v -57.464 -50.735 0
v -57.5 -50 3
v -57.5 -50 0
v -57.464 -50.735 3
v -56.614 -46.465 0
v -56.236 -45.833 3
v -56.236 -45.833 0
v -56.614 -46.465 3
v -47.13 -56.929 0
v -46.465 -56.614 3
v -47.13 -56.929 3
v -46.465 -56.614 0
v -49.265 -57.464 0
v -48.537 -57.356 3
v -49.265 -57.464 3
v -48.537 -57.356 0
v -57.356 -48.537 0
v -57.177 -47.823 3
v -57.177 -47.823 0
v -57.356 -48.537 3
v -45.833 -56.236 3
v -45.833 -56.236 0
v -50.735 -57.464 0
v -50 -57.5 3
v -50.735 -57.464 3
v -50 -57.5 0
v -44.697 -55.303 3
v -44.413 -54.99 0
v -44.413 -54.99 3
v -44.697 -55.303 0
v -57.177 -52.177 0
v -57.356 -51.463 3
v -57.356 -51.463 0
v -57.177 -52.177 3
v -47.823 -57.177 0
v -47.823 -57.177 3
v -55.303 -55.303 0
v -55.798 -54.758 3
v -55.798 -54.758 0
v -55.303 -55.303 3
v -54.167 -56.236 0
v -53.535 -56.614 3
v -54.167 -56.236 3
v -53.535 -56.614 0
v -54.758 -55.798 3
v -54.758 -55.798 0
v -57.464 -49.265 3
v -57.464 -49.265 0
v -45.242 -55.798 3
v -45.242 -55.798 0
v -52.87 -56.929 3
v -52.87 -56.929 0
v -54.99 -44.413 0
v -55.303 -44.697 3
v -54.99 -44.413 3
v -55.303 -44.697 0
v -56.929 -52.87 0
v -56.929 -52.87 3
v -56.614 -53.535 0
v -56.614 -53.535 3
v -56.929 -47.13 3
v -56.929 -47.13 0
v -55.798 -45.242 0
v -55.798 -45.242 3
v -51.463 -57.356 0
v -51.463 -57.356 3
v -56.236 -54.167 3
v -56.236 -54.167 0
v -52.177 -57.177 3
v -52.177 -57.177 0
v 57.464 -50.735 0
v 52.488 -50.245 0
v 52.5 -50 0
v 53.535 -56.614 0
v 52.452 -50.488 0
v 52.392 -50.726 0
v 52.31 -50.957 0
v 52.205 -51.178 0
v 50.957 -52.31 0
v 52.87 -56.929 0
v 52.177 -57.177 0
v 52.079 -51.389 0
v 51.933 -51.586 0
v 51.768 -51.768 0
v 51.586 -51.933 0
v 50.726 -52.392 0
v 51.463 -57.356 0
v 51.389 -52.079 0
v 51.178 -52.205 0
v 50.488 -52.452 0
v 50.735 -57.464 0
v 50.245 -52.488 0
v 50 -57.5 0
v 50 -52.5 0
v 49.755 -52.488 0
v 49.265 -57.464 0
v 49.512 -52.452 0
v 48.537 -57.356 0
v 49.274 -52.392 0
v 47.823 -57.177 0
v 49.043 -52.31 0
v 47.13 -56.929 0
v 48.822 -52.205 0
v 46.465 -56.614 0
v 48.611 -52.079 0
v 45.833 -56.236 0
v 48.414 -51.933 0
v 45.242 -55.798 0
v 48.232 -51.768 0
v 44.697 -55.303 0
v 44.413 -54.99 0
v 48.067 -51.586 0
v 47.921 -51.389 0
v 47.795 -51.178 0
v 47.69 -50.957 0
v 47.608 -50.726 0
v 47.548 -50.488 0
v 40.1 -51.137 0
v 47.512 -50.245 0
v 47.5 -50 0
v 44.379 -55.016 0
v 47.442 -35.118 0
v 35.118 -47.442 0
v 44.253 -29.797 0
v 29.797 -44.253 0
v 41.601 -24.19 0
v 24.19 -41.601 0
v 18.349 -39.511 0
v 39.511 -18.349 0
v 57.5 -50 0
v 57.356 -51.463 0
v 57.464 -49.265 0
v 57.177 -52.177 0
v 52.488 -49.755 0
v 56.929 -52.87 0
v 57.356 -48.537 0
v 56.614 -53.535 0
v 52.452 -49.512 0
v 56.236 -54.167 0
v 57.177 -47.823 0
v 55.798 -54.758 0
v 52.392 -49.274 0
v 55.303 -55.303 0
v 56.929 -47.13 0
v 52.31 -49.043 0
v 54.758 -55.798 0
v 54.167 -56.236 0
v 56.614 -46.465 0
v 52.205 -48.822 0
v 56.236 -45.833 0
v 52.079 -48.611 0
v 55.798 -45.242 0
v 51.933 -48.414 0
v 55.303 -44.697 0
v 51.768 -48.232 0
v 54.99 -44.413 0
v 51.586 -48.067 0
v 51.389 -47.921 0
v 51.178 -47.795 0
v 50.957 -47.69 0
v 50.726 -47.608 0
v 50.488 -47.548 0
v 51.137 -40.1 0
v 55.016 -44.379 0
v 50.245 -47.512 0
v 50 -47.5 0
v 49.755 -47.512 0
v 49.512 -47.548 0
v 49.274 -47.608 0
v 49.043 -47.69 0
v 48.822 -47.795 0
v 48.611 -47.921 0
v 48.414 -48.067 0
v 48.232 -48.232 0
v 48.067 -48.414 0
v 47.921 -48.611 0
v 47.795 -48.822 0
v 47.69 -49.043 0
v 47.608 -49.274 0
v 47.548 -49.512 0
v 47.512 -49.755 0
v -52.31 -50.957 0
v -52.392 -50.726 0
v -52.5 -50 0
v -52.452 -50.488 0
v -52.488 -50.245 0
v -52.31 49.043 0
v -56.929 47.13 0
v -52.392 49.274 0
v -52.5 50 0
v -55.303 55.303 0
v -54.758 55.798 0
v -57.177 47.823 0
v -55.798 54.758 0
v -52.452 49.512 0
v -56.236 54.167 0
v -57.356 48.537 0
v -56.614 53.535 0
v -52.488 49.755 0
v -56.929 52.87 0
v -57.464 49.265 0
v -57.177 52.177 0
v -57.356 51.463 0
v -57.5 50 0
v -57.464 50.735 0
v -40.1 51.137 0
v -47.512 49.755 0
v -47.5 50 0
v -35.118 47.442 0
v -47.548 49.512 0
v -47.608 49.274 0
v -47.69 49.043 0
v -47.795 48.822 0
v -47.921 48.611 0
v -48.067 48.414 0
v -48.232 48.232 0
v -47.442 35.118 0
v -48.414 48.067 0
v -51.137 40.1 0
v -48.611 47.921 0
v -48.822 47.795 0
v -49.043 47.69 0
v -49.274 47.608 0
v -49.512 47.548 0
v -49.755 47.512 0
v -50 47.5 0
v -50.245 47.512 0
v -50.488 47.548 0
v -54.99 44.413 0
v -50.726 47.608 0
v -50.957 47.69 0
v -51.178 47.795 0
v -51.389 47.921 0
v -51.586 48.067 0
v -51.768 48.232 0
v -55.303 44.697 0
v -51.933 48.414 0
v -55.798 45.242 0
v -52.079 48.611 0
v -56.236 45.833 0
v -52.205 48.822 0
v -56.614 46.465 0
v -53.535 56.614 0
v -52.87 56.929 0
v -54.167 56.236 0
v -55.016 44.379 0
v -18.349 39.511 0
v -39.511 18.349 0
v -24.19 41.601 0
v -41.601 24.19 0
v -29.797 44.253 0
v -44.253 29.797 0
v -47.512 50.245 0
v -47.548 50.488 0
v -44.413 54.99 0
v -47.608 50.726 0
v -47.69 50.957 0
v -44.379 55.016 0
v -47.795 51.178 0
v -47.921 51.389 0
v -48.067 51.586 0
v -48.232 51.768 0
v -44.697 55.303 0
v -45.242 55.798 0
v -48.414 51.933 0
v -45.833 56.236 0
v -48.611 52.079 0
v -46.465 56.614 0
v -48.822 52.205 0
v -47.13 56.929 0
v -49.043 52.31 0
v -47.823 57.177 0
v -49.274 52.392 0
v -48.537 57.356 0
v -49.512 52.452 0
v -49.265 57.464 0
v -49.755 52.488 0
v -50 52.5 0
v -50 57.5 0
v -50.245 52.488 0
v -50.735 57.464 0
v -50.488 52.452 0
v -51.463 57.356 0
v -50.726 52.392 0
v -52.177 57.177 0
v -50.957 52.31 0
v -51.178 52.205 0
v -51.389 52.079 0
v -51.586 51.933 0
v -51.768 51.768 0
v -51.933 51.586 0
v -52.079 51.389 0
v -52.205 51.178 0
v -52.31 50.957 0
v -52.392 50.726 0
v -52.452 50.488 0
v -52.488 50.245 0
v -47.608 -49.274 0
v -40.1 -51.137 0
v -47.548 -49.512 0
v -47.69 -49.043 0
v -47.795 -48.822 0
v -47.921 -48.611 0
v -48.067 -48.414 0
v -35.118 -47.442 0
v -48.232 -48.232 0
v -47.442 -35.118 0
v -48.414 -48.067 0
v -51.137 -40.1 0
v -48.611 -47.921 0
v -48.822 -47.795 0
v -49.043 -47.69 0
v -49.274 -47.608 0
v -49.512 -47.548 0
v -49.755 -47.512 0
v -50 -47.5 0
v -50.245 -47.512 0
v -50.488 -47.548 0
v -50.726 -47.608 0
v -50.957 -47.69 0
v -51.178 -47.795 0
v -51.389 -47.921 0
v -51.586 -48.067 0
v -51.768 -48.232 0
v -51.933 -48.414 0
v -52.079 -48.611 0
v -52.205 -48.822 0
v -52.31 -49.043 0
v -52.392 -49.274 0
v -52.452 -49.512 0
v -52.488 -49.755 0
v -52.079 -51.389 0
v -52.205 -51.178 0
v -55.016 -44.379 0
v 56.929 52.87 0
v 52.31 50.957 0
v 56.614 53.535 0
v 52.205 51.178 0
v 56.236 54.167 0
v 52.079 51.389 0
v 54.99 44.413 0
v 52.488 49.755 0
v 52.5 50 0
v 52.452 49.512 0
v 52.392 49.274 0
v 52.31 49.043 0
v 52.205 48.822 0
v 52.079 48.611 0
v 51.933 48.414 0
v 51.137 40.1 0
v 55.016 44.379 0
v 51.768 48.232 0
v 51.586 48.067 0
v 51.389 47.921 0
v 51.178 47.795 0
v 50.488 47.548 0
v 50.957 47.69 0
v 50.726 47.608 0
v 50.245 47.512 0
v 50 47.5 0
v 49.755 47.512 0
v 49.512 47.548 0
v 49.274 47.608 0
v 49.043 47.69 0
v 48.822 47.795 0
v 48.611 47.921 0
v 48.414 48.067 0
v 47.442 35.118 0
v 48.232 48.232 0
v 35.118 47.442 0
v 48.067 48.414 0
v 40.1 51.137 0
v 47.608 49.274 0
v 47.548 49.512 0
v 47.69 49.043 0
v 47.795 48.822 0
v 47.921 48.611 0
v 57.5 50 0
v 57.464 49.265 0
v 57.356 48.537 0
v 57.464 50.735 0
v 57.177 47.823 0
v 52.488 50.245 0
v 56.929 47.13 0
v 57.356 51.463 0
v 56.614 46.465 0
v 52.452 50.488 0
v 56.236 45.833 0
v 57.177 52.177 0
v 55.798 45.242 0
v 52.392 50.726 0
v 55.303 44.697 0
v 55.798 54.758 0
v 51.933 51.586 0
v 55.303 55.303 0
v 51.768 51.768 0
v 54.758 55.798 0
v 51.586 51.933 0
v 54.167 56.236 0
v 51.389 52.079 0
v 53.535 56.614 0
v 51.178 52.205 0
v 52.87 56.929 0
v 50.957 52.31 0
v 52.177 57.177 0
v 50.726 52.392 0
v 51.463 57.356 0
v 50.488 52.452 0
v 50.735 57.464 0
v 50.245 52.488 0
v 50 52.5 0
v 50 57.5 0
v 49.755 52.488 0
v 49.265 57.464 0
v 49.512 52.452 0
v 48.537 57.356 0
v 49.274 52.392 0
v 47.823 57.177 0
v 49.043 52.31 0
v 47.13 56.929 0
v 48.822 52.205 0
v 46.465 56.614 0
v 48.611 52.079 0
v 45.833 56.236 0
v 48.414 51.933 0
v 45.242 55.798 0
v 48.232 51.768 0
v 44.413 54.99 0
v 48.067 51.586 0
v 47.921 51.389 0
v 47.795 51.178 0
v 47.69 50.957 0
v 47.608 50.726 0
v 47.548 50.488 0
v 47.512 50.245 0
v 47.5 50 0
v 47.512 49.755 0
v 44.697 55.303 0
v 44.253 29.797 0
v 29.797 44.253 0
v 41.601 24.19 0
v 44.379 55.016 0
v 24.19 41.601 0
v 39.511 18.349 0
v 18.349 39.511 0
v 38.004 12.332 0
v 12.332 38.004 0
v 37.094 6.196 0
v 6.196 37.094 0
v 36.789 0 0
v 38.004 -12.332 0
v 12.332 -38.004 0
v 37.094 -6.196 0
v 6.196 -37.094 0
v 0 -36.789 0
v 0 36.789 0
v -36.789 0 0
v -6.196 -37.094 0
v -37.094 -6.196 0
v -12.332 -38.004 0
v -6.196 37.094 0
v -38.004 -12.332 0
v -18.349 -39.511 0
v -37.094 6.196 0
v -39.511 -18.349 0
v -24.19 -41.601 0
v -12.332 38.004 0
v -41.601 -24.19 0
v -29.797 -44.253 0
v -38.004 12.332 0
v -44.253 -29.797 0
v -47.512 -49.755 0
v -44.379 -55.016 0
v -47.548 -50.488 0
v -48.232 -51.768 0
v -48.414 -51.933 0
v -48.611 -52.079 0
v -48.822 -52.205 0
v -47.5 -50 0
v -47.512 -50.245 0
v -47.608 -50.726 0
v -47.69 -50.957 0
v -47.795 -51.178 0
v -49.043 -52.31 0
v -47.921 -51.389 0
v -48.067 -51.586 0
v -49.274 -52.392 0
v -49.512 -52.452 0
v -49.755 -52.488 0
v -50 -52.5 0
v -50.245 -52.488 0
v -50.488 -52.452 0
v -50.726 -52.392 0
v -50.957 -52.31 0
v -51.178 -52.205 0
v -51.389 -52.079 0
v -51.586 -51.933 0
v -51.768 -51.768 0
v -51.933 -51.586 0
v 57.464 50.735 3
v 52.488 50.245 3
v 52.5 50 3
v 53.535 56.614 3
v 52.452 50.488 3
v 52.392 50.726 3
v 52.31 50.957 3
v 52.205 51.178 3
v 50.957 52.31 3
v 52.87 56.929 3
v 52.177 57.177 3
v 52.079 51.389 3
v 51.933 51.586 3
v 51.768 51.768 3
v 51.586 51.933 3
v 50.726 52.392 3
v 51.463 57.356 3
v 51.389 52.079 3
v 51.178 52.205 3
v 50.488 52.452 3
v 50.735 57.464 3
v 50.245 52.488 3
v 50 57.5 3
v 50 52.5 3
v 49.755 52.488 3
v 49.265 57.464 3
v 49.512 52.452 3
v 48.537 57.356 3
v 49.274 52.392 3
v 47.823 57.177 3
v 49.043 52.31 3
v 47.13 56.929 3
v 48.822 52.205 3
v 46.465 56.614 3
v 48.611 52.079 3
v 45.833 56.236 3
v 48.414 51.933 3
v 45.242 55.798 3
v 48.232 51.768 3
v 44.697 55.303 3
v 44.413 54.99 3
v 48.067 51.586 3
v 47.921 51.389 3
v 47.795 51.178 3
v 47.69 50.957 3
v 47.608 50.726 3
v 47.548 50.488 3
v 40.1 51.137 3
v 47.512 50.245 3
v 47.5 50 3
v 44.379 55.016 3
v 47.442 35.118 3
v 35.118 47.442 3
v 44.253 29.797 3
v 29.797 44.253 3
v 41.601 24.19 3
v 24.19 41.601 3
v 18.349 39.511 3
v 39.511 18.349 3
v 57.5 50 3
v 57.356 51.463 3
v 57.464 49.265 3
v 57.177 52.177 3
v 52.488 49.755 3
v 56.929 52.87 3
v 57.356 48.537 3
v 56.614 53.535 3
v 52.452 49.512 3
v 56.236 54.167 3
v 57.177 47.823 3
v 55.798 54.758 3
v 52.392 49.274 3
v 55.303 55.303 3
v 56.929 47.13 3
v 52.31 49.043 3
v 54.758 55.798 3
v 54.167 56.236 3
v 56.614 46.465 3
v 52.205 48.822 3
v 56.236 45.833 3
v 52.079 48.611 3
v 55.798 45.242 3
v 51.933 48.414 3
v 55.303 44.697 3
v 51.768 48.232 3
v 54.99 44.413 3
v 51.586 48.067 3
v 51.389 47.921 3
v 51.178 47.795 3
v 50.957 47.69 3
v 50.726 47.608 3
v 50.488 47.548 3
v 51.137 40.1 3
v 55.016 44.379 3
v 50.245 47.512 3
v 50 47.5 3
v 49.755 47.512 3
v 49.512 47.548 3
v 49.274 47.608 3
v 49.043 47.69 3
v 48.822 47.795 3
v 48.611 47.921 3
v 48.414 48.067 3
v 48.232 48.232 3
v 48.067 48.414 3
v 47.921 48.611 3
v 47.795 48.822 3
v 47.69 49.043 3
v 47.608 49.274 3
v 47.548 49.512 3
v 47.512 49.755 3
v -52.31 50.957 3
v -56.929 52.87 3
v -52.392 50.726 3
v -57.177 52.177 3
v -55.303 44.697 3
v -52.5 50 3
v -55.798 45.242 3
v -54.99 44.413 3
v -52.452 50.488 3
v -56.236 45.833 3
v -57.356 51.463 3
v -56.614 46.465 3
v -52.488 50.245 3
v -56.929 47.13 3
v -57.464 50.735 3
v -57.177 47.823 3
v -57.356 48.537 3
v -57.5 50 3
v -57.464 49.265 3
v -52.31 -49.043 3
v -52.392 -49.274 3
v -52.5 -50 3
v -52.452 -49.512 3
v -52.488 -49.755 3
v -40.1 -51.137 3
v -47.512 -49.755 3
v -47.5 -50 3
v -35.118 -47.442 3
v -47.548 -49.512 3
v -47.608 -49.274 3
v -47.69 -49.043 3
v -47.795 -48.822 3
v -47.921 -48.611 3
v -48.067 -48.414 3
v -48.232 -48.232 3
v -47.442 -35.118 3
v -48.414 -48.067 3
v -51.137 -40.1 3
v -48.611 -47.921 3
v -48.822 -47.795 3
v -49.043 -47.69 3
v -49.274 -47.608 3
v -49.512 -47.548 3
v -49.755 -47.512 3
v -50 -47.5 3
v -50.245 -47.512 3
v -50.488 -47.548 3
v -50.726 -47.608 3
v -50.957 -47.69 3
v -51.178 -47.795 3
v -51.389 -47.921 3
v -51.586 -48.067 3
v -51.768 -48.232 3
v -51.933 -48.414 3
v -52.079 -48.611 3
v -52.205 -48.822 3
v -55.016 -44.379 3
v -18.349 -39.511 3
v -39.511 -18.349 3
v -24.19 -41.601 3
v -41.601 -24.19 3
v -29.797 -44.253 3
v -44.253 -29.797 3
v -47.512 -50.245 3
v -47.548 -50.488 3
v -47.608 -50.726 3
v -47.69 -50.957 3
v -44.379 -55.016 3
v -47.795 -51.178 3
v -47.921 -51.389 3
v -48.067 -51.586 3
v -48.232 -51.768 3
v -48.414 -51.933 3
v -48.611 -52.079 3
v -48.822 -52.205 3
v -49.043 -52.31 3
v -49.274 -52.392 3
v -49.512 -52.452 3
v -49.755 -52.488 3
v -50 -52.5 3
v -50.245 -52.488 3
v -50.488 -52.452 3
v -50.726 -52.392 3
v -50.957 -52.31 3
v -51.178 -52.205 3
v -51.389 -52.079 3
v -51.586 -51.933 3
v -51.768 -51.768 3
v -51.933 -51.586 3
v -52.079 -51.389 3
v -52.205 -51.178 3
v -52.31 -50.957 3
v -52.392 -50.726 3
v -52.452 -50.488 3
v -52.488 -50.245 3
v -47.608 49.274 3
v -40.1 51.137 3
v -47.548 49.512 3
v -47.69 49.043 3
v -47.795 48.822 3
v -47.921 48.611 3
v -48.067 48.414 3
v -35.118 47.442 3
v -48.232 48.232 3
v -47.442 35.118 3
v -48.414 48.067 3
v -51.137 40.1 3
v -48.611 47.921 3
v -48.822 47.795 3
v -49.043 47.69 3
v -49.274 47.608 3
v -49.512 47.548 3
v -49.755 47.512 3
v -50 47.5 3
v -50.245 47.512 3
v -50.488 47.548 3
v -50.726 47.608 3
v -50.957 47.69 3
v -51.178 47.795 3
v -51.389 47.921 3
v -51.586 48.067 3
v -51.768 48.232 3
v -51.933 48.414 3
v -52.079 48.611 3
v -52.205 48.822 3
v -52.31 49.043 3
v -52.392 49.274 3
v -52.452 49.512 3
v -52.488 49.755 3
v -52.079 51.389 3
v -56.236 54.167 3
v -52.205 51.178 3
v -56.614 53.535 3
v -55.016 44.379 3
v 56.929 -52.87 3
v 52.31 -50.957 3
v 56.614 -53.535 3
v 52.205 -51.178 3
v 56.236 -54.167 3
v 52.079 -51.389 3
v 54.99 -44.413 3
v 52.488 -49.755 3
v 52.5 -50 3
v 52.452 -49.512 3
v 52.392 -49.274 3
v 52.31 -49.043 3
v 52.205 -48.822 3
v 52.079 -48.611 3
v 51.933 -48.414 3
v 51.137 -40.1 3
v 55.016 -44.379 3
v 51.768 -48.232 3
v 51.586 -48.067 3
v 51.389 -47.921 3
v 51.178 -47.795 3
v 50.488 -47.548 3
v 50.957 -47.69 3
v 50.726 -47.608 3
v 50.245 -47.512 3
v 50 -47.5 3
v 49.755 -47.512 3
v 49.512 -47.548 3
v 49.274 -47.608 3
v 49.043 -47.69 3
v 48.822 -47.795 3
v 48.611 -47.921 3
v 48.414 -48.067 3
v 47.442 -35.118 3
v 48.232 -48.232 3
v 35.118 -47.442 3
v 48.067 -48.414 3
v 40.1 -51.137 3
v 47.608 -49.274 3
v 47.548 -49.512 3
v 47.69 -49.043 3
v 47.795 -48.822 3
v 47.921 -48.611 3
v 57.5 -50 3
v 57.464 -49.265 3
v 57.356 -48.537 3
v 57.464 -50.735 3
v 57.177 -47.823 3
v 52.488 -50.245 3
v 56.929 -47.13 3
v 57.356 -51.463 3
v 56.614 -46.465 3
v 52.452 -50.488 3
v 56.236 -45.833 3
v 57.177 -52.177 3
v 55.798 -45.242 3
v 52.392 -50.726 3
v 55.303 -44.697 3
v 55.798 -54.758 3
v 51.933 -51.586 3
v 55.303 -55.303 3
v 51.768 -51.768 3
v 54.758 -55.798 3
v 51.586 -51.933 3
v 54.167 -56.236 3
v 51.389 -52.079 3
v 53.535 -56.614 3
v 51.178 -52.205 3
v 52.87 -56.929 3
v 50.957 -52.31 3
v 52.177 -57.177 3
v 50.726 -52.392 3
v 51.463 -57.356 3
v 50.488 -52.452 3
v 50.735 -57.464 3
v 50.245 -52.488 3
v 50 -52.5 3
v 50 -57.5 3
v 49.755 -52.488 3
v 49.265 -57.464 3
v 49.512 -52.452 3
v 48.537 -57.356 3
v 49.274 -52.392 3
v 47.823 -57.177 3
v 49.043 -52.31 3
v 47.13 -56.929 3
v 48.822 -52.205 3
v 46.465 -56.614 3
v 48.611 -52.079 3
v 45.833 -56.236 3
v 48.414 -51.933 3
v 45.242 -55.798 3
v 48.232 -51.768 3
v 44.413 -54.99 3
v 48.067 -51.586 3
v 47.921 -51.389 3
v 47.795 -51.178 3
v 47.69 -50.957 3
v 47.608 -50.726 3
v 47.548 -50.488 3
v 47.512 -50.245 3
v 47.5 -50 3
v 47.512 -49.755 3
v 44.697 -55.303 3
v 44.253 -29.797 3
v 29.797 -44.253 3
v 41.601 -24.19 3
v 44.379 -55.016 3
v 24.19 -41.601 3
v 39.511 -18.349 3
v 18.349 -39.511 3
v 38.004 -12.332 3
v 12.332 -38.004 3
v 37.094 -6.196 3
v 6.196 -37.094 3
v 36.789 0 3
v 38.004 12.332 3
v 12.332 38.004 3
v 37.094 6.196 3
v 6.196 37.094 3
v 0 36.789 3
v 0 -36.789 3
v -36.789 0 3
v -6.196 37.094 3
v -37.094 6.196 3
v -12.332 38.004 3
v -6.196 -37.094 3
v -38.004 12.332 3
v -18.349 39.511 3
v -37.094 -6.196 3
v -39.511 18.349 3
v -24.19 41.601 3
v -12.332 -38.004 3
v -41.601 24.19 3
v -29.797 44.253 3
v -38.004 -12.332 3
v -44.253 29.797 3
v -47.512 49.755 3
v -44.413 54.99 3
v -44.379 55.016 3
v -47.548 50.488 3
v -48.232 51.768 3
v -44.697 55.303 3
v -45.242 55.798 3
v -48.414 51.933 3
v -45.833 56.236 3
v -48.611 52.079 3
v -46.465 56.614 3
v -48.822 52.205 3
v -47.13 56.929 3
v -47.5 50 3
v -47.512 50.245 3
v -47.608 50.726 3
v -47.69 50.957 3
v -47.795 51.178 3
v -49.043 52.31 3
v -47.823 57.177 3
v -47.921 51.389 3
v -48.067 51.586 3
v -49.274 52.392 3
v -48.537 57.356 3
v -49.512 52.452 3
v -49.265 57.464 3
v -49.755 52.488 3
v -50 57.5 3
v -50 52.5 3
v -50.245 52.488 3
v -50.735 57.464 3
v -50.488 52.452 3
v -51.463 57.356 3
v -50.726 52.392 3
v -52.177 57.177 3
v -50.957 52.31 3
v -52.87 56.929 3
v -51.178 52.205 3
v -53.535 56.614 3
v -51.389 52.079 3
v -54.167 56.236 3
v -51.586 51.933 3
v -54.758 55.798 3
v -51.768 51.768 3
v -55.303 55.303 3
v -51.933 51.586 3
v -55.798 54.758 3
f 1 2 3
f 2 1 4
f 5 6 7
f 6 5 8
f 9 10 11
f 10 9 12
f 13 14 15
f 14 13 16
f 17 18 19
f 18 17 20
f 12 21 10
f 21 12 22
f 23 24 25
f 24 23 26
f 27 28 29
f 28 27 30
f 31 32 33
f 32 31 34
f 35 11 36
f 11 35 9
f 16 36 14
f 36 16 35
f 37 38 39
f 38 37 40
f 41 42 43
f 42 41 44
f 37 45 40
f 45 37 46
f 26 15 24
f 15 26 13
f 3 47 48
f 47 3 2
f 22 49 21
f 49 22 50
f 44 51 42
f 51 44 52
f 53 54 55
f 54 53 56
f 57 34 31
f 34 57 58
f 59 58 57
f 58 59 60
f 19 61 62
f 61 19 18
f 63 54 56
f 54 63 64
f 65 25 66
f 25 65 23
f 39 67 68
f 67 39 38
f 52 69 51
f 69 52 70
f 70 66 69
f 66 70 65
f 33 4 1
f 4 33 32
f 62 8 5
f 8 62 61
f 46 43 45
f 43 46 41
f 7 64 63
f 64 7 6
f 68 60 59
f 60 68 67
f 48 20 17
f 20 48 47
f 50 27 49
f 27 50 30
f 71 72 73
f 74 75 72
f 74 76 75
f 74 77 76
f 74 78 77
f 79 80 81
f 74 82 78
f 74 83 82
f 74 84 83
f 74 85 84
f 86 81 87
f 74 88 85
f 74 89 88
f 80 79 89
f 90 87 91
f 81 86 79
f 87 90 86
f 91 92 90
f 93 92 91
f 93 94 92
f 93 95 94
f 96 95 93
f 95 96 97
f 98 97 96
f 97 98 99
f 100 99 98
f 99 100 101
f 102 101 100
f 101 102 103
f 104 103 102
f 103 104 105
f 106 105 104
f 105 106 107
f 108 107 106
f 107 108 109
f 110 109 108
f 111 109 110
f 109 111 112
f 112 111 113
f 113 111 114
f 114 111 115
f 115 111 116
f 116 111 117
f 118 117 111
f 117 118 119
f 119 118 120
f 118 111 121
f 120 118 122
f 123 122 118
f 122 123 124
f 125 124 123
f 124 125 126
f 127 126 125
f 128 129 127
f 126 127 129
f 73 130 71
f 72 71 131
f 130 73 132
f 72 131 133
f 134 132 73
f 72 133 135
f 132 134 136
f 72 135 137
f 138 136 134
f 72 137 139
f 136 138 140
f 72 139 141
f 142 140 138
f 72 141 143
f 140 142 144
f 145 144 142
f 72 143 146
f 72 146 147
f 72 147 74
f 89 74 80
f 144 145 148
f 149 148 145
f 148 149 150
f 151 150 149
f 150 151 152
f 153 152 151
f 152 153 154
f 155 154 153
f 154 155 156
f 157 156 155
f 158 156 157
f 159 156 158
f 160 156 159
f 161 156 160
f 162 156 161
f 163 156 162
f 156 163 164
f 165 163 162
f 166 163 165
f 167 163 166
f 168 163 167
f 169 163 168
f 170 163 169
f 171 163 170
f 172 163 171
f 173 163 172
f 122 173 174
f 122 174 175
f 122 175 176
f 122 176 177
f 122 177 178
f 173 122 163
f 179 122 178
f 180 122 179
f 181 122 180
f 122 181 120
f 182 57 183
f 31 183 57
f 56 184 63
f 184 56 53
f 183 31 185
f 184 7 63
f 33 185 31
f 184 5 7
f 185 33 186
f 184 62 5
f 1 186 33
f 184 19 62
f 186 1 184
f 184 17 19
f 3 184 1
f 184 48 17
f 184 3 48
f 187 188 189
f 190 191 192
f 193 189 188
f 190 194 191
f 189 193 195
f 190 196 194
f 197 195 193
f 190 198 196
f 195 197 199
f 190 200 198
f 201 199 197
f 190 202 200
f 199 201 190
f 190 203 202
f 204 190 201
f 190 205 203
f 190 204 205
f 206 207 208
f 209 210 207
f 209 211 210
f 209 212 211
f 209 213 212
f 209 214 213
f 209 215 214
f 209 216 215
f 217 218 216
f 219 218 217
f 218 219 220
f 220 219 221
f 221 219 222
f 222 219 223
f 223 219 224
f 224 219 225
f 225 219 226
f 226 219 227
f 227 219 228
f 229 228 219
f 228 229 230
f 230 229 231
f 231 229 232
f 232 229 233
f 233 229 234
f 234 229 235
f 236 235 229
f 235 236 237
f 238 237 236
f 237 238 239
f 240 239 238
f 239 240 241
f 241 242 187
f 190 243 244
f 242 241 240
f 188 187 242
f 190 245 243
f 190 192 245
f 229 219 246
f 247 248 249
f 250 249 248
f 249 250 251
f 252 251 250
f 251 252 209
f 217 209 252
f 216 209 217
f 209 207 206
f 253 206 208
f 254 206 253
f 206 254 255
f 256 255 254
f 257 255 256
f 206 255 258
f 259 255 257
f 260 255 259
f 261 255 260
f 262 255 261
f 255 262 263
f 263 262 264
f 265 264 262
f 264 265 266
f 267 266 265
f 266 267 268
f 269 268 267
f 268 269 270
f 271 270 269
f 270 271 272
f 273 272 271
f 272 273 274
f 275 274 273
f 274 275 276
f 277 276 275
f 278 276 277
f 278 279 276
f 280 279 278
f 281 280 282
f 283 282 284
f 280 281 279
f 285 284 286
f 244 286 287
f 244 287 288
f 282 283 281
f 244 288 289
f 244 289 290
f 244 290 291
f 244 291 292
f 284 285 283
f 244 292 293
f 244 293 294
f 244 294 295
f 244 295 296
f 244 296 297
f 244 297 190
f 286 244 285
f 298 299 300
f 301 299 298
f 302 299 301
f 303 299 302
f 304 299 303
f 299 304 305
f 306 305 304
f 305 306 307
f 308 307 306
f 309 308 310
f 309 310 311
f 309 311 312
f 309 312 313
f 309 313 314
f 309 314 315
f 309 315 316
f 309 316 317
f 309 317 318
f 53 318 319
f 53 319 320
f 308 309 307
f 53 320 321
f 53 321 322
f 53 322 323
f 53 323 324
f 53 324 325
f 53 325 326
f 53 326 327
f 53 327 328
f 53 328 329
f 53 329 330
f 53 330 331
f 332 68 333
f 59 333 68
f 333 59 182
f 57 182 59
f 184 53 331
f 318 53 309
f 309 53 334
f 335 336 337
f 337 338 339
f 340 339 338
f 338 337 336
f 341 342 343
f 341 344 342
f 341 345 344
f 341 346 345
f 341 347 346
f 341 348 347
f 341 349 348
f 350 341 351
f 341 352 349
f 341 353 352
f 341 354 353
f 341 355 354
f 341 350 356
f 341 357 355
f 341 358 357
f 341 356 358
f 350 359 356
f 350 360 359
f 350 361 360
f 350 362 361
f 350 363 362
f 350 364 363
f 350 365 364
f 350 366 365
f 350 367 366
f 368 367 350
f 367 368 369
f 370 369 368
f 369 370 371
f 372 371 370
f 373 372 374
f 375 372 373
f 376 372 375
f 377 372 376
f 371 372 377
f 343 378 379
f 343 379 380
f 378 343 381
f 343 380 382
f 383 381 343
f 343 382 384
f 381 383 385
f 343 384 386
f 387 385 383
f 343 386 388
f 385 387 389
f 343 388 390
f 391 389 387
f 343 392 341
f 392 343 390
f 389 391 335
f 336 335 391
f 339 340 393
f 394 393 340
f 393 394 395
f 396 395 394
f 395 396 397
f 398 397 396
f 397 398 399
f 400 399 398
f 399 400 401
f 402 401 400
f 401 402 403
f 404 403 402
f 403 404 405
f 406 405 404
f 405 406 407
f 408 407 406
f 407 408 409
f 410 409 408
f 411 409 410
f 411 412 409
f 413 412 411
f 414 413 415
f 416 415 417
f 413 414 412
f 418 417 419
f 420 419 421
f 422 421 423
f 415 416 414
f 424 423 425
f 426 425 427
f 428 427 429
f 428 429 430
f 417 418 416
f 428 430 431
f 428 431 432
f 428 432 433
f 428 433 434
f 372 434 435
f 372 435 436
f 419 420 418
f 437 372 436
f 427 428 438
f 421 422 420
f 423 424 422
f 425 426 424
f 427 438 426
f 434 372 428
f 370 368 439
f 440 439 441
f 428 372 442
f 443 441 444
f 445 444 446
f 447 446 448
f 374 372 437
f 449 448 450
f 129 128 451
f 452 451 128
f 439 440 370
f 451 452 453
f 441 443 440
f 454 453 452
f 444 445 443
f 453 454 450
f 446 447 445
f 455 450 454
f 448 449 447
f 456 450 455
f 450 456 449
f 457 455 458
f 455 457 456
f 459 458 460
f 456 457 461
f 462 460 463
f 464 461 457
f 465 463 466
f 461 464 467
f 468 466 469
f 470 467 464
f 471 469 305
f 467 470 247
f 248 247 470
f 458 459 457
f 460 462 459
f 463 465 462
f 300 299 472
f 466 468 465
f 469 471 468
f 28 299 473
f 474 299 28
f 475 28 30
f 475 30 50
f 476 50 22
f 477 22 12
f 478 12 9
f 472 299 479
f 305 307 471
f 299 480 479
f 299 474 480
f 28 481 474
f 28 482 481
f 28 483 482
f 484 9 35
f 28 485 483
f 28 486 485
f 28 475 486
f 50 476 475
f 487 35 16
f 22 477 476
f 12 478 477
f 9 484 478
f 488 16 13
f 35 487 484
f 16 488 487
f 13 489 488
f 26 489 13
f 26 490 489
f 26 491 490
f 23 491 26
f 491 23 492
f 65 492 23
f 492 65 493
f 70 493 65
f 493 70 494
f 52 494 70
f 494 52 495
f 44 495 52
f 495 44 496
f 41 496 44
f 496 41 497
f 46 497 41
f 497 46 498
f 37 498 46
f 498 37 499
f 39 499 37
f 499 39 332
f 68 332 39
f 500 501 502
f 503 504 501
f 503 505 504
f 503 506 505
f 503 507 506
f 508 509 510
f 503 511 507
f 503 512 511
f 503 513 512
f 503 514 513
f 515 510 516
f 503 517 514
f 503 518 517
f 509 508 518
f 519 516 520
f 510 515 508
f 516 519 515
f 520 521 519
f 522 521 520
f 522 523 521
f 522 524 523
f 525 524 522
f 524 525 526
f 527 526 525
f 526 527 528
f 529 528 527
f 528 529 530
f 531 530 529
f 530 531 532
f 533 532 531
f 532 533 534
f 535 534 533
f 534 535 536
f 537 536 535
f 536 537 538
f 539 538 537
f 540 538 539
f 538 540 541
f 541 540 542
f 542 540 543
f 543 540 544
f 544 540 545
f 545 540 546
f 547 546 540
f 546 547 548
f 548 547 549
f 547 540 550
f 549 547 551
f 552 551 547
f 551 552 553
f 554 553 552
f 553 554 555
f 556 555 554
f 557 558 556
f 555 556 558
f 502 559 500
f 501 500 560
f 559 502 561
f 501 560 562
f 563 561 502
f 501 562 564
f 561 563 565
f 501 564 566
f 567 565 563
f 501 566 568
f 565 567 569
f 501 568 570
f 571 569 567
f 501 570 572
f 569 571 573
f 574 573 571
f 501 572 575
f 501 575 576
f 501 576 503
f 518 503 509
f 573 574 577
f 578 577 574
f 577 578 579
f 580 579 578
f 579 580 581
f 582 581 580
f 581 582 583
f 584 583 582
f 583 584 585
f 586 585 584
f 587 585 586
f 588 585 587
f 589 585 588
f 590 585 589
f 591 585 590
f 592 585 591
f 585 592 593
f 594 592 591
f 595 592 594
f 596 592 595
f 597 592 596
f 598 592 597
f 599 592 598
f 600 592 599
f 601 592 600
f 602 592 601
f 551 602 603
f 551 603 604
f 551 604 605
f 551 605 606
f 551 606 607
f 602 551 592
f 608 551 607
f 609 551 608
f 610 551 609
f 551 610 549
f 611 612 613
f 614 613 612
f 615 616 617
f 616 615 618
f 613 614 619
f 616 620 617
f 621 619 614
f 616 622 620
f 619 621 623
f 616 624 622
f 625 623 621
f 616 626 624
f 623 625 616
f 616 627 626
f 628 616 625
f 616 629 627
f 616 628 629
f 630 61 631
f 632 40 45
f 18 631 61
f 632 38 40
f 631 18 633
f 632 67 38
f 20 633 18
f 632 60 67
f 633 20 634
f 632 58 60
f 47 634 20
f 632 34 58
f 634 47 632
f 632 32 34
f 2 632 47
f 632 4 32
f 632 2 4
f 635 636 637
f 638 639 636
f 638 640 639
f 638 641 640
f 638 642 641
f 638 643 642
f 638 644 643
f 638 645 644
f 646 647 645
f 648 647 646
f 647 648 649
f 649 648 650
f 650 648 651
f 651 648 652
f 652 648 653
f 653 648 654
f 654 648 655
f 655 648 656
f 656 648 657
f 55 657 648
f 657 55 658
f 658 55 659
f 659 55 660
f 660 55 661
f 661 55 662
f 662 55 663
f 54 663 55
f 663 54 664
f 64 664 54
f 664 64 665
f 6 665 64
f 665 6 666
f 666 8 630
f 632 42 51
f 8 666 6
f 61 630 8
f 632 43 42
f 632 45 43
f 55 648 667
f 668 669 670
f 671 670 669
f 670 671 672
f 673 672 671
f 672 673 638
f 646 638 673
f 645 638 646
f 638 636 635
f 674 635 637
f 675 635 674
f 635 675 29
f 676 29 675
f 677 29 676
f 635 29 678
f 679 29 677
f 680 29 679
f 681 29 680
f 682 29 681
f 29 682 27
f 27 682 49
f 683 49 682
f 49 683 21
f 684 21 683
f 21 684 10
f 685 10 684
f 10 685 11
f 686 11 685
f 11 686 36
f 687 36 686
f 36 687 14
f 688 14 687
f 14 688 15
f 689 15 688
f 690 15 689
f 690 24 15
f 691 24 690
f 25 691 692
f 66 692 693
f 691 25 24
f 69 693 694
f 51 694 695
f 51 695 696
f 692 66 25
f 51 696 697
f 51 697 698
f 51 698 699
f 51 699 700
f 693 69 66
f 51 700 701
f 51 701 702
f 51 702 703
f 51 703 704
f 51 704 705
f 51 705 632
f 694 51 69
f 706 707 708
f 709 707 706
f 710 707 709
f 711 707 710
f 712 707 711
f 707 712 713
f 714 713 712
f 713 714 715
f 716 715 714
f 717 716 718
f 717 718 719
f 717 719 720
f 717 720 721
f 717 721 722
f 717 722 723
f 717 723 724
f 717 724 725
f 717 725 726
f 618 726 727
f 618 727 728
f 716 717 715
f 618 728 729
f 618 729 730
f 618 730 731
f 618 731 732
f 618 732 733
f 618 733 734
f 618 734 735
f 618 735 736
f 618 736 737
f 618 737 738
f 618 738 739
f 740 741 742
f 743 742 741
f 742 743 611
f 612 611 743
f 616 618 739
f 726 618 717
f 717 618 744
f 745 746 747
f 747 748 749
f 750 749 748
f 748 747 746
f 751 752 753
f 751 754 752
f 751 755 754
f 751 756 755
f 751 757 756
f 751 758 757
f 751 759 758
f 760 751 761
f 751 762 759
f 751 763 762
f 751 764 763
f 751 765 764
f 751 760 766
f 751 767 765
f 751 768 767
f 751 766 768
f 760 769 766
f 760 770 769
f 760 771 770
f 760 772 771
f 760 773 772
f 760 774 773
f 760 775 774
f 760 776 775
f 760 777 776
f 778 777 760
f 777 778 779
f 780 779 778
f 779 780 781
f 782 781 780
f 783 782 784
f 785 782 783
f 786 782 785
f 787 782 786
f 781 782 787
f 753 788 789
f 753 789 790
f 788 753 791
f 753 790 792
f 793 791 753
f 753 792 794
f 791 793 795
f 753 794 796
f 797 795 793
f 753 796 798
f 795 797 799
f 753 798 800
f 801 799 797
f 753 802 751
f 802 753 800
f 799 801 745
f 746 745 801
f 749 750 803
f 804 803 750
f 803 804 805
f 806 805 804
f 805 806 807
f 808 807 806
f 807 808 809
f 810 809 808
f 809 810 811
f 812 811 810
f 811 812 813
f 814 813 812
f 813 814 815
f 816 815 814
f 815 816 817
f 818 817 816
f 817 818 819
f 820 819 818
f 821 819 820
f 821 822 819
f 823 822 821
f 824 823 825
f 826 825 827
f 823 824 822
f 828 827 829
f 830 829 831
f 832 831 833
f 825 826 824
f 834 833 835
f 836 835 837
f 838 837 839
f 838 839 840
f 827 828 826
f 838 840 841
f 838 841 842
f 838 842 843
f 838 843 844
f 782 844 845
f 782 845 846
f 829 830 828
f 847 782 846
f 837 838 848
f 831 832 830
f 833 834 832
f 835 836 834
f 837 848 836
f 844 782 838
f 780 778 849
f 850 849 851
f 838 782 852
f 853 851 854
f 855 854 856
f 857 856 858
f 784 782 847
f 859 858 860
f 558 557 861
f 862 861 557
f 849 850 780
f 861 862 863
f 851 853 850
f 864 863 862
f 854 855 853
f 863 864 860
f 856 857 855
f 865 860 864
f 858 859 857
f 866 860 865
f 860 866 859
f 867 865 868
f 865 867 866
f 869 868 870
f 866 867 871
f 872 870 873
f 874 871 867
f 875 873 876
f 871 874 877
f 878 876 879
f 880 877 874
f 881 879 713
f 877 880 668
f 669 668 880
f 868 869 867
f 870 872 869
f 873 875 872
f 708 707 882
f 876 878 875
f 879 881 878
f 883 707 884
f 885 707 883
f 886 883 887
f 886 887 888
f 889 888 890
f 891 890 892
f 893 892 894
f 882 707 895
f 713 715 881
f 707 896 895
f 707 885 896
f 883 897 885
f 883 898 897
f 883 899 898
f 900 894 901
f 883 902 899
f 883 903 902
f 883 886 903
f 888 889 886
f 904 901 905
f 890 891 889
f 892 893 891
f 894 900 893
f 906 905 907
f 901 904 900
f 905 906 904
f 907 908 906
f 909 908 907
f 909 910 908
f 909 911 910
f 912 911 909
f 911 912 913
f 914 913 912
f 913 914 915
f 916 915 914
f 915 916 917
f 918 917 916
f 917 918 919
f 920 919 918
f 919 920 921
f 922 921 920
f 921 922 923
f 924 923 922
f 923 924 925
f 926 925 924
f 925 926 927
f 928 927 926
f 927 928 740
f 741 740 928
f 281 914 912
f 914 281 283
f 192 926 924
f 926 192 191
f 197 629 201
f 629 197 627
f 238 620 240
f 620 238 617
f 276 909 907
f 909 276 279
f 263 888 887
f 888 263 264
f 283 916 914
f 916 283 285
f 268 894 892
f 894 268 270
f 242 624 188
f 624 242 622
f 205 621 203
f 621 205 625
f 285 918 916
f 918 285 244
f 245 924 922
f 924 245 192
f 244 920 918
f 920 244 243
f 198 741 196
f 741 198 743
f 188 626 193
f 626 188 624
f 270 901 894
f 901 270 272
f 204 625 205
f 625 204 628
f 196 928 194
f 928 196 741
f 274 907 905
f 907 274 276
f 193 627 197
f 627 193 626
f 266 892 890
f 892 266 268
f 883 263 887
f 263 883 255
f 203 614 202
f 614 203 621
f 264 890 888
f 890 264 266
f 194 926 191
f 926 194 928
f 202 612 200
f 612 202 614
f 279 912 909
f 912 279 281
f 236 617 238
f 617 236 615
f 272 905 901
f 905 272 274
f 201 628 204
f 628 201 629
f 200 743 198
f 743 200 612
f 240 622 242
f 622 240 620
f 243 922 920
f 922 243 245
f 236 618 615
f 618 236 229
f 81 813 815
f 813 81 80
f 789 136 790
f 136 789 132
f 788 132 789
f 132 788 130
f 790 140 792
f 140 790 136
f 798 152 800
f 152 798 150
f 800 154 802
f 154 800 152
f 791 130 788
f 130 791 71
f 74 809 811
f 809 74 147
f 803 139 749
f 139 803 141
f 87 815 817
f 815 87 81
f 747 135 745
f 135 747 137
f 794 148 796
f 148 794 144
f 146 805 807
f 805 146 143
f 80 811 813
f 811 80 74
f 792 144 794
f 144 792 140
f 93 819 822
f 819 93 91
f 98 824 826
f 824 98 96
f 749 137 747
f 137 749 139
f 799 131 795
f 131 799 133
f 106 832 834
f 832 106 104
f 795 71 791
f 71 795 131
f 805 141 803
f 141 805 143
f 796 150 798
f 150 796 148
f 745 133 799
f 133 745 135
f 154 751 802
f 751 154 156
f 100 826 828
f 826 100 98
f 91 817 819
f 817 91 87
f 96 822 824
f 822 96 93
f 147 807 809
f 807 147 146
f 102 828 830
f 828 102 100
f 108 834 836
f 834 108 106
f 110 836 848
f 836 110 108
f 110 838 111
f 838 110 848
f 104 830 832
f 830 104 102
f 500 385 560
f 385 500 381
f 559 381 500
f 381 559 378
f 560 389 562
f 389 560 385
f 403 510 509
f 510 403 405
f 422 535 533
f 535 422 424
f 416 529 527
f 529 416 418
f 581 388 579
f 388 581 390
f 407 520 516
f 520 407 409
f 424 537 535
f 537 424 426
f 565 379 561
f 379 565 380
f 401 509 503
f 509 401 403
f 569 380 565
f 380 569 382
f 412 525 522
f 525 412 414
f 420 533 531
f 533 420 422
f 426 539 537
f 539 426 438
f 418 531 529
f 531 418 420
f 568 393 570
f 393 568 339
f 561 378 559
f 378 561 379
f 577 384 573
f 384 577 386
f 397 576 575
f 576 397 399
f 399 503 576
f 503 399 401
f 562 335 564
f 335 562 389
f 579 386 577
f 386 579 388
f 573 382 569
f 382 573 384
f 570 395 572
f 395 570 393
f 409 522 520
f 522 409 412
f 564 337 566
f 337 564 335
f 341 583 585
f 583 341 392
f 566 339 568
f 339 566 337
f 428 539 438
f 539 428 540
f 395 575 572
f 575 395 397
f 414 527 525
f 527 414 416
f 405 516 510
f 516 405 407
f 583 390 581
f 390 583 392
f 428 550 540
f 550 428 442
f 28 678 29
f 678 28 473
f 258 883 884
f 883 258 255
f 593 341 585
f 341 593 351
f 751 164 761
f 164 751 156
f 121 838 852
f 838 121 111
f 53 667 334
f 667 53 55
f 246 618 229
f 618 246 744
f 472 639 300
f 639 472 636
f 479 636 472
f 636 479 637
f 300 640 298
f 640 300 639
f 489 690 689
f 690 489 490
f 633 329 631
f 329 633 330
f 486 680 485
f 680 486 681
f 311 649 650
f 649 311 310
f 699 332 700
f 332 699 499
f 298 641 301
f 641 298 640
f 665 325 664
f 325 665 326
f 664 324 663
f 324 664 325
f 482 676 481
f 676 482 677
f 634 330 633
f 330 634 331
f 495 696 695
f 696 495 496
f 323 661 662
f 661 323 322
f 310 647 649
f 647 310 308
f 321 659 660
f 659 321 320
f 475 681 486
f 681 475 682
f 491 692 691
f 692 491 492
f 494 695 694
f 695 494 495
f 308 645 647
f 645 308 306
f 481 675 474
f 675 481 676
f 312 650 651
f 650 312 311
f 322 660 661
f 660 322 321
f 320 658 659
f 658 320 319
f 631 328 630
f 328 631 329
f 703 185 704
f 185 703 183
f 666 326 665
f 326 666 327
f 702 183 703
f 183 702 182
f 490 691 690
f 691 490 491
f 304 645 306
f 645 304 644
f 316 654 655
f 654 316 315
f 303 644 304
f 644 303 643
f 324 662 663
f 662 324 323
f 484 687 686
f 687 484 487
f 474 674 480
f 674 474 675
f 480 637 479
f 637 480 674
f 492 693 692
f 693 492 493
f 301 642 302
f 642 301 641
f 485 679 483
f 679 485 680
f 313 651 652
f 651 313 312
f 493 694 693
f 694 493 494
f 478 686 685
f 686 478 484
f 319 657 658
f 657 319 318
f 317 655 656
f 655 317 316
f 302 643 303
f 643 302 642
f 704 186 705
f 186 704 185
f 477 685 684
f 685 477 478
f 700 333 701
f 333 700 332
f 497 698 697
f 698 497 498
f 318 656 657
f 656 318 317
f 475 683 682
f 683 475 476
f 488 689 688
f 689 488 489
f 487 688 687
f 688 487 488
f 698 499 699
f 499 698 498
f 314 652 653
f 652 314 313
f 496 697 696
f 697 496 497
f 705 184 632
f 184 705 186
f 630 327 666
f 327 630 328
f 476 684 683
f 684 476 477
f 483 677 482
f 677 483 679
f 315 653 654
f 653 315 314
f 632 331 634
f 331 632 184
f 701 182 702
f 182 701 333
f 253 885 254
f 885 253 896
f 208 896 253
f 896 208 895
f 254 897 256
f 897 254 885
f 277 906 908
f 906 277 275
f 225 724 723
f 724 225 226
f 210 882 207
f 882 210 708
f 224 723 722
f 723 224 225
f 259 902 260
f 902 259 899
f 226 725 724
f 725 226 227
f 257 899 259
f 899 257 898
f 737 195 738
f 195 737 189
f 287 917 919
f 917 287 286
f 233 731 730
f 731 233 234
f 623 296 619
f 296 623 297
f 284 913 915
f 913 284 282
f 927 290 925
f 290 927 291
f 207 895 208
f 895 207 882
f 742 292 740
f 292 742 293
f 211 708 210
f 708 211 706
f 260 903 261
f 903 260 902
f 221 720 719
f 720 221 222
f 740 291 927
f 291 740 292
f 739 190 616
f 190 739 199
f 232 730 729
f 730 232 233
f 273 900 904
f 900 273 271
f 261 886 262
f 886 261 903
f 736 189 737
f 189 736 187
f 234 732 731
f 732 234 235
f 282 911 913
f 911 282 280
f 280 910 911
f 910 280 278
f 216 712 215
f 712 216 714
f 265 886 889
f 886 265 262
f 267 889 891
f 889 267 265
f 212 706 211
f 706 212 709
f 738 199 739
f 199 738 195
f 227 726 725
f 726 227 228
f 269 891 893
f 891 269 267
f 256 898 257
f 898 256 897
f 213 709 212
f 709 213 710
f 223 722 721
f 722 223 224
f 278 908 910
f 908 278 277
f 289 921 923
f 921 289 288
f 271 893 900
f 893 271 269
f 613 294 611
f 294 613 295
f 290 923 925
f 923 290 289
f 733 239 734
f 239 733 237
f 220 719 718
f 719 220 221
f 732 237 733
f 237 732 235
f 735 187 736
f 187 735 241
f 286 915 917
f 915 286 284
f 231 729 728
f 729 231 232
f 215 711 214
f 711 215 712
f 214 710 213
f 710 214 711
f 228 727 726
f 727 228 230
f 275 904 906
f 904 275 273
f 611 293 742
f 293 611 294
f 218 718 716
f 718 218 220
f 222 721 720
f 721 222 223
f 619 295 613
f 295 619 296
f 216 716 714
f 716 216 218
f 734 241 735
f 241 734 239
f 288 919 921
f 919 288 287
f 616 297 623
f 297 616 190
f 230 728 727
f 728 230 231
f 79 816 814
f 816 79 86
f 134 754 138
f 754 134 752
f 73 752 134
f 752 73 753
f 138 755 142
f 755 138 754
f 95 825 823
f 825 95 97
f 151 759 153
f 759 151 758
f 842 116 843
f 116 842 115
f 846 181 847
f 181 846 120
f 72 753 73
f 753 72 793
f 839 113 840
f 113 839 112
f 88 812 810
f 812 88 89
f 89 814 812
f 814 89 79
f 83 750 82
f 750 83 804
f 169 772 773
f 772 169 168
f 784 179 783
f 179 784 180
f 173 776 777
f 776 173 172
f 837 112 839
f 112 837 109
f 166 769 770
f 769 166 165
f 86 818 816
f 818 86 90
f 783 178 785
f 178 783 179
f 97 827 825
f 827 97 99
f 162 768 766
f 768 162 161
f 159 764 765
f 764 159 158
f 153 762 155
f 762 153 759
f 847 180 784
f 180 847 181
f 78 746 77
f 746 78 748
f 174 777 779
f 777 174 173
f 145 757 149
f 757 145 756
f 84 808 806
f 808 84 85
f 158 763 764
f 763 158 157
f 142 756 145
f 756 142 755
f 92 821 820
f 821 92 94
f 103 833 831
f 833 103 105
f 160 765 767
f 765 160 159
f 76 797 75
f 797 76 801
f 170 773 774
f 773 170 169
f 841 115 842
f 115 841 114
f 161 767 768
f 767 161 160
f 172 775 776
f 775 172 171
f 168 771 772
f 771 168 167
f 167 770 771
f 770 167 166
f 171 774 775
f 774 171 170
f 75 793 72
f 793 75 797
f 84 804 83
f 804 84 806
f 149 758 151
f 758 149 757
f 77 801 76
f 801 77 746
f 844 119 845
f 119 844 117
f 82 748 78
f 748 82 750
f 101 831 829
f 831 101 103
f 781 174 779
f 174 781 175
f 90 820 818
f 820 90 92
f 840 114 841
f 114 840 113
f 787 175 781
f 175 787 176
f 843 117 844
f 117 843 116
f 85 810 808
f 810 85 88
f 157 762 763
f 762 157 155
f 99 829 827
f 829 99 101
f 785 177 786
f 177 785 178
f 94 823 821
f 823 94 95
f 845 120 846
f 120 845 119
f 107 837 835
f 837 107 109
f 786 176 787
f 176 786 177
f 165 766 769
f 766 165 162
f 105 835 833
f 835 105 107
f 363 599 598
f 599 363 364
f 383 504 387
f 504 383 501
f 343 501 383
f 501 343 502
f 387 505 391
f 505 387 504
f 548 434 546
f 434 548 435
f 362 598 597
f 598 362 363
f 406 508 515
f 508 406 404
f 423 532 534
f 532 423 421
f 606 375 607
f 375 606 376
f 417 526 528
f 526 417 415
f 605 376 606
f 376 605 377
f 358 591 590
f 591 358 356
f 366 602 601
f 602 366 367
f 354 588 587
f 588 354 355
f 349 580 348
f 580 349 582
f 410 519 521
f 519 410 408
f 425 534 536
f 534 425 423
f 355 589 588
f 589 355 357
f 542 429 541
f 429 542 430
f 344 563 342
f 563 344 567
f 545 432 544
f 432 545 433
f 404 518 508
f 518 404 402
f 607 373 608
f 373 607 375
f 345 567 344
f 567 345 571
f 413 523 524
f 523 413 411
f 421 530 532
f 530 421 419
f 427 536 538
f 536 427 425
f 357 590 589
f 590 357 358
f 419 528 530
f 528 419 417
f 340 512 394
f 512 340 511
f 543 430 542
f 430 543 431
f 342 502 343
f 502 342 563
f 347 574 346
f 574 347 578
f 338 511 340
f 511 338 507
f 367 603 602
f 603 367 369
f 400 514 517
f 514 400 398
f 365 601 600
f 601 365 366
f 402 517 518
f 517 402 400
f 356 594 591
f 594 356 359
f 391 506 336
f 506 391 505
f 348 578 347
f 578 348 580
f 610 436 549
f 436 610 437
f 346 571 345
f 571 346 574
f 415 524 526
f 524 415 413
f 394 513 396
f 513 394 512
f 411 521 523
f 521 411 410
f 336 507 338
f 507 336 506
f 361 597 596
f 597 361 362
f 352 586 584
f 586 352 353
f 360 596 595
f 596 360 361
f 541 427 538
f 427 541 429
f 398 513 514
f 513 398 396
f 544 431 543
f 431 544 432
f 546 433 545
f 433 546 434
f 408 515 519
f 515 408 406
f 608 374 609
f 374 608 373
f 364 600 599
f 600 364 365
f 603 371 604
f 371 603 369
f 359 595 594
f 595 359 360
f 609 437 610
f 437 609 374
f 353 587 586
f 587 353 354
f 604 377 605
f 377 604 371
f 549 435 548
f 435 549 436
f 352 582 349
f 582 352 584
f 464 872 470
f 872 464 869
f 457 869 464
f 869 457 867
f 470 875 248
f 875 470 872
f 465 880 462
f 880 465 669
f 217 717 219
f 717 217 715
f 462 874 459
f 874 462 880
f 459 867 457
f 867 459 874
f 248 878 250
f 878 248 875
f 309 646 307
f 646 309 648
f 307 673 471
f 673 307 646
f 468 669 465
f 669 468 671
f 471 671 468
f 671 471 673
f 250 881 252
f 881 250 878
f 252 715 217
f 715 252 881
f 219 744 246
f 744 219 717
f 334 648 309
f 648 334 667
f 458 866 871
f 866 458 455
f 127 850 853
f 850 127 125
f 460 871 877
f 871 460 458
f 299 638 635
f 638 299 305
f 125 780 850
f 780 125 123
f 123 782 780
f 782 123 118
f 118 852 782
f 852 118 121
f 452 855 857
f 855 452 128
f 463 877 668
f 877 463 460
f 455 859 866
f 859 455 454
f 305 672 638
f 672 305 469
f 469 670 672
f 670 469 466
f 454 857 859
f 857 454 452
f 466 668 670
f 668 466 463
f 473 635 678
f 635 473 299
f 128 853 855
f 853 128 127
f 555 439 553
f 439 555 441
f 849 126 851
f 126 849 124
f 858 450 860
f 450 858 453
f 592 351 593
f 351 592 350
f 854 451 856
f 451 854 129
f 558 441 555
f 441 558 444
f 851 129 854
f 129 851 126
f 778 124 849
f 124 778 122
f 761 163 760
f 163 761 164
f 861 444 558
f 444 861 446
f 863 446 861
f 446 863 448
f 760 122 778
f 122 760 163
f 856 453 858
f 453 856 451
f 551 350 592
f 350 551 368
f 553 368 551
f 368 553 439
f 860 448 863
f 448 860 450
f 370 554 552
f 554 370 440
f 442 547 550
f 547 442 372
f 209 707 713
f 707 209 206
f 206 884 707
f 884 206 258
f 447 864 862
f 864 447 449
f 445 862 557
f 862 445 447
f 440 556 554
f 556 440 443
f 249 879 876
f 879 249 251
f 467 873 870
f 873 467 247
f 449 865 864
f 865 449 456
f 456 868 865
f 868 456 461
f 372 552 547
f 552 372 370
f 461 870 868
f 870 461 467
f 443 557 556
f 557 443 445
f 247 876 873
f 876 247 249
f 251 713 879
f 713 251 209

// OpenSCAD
vesa=100; //mm
drill=2.5; //radius, not diameter

l=sqrt(pow(drill*3,2)/2);
radius=(drill*3)*(vesa/2-l)/l;
$fn = 64; //number of faces on a circle

difference()
{
    union()
    {
        cylinder(3,radius+drill*3,radius+drill*3);
        for(x = [-1,1])
            for(y = [-1,1])
            translate([x*vesa/2,y*vesa/2,0])
                    cylinder(3,drill*3,drill*3);
    }
    for(x = [-1,1])
    {
        translate([x*vesa,0,0])
            cylinder(3,radius,radius);
        translate([0,x*vesa,0])
                    cylinder(3,radius,radius);
        for(y = [-1,1])
        {
            translate([x*vesa/2,y*vesa/2,0])
                    cylinder(4,drill,drill);


        }
    }
}
